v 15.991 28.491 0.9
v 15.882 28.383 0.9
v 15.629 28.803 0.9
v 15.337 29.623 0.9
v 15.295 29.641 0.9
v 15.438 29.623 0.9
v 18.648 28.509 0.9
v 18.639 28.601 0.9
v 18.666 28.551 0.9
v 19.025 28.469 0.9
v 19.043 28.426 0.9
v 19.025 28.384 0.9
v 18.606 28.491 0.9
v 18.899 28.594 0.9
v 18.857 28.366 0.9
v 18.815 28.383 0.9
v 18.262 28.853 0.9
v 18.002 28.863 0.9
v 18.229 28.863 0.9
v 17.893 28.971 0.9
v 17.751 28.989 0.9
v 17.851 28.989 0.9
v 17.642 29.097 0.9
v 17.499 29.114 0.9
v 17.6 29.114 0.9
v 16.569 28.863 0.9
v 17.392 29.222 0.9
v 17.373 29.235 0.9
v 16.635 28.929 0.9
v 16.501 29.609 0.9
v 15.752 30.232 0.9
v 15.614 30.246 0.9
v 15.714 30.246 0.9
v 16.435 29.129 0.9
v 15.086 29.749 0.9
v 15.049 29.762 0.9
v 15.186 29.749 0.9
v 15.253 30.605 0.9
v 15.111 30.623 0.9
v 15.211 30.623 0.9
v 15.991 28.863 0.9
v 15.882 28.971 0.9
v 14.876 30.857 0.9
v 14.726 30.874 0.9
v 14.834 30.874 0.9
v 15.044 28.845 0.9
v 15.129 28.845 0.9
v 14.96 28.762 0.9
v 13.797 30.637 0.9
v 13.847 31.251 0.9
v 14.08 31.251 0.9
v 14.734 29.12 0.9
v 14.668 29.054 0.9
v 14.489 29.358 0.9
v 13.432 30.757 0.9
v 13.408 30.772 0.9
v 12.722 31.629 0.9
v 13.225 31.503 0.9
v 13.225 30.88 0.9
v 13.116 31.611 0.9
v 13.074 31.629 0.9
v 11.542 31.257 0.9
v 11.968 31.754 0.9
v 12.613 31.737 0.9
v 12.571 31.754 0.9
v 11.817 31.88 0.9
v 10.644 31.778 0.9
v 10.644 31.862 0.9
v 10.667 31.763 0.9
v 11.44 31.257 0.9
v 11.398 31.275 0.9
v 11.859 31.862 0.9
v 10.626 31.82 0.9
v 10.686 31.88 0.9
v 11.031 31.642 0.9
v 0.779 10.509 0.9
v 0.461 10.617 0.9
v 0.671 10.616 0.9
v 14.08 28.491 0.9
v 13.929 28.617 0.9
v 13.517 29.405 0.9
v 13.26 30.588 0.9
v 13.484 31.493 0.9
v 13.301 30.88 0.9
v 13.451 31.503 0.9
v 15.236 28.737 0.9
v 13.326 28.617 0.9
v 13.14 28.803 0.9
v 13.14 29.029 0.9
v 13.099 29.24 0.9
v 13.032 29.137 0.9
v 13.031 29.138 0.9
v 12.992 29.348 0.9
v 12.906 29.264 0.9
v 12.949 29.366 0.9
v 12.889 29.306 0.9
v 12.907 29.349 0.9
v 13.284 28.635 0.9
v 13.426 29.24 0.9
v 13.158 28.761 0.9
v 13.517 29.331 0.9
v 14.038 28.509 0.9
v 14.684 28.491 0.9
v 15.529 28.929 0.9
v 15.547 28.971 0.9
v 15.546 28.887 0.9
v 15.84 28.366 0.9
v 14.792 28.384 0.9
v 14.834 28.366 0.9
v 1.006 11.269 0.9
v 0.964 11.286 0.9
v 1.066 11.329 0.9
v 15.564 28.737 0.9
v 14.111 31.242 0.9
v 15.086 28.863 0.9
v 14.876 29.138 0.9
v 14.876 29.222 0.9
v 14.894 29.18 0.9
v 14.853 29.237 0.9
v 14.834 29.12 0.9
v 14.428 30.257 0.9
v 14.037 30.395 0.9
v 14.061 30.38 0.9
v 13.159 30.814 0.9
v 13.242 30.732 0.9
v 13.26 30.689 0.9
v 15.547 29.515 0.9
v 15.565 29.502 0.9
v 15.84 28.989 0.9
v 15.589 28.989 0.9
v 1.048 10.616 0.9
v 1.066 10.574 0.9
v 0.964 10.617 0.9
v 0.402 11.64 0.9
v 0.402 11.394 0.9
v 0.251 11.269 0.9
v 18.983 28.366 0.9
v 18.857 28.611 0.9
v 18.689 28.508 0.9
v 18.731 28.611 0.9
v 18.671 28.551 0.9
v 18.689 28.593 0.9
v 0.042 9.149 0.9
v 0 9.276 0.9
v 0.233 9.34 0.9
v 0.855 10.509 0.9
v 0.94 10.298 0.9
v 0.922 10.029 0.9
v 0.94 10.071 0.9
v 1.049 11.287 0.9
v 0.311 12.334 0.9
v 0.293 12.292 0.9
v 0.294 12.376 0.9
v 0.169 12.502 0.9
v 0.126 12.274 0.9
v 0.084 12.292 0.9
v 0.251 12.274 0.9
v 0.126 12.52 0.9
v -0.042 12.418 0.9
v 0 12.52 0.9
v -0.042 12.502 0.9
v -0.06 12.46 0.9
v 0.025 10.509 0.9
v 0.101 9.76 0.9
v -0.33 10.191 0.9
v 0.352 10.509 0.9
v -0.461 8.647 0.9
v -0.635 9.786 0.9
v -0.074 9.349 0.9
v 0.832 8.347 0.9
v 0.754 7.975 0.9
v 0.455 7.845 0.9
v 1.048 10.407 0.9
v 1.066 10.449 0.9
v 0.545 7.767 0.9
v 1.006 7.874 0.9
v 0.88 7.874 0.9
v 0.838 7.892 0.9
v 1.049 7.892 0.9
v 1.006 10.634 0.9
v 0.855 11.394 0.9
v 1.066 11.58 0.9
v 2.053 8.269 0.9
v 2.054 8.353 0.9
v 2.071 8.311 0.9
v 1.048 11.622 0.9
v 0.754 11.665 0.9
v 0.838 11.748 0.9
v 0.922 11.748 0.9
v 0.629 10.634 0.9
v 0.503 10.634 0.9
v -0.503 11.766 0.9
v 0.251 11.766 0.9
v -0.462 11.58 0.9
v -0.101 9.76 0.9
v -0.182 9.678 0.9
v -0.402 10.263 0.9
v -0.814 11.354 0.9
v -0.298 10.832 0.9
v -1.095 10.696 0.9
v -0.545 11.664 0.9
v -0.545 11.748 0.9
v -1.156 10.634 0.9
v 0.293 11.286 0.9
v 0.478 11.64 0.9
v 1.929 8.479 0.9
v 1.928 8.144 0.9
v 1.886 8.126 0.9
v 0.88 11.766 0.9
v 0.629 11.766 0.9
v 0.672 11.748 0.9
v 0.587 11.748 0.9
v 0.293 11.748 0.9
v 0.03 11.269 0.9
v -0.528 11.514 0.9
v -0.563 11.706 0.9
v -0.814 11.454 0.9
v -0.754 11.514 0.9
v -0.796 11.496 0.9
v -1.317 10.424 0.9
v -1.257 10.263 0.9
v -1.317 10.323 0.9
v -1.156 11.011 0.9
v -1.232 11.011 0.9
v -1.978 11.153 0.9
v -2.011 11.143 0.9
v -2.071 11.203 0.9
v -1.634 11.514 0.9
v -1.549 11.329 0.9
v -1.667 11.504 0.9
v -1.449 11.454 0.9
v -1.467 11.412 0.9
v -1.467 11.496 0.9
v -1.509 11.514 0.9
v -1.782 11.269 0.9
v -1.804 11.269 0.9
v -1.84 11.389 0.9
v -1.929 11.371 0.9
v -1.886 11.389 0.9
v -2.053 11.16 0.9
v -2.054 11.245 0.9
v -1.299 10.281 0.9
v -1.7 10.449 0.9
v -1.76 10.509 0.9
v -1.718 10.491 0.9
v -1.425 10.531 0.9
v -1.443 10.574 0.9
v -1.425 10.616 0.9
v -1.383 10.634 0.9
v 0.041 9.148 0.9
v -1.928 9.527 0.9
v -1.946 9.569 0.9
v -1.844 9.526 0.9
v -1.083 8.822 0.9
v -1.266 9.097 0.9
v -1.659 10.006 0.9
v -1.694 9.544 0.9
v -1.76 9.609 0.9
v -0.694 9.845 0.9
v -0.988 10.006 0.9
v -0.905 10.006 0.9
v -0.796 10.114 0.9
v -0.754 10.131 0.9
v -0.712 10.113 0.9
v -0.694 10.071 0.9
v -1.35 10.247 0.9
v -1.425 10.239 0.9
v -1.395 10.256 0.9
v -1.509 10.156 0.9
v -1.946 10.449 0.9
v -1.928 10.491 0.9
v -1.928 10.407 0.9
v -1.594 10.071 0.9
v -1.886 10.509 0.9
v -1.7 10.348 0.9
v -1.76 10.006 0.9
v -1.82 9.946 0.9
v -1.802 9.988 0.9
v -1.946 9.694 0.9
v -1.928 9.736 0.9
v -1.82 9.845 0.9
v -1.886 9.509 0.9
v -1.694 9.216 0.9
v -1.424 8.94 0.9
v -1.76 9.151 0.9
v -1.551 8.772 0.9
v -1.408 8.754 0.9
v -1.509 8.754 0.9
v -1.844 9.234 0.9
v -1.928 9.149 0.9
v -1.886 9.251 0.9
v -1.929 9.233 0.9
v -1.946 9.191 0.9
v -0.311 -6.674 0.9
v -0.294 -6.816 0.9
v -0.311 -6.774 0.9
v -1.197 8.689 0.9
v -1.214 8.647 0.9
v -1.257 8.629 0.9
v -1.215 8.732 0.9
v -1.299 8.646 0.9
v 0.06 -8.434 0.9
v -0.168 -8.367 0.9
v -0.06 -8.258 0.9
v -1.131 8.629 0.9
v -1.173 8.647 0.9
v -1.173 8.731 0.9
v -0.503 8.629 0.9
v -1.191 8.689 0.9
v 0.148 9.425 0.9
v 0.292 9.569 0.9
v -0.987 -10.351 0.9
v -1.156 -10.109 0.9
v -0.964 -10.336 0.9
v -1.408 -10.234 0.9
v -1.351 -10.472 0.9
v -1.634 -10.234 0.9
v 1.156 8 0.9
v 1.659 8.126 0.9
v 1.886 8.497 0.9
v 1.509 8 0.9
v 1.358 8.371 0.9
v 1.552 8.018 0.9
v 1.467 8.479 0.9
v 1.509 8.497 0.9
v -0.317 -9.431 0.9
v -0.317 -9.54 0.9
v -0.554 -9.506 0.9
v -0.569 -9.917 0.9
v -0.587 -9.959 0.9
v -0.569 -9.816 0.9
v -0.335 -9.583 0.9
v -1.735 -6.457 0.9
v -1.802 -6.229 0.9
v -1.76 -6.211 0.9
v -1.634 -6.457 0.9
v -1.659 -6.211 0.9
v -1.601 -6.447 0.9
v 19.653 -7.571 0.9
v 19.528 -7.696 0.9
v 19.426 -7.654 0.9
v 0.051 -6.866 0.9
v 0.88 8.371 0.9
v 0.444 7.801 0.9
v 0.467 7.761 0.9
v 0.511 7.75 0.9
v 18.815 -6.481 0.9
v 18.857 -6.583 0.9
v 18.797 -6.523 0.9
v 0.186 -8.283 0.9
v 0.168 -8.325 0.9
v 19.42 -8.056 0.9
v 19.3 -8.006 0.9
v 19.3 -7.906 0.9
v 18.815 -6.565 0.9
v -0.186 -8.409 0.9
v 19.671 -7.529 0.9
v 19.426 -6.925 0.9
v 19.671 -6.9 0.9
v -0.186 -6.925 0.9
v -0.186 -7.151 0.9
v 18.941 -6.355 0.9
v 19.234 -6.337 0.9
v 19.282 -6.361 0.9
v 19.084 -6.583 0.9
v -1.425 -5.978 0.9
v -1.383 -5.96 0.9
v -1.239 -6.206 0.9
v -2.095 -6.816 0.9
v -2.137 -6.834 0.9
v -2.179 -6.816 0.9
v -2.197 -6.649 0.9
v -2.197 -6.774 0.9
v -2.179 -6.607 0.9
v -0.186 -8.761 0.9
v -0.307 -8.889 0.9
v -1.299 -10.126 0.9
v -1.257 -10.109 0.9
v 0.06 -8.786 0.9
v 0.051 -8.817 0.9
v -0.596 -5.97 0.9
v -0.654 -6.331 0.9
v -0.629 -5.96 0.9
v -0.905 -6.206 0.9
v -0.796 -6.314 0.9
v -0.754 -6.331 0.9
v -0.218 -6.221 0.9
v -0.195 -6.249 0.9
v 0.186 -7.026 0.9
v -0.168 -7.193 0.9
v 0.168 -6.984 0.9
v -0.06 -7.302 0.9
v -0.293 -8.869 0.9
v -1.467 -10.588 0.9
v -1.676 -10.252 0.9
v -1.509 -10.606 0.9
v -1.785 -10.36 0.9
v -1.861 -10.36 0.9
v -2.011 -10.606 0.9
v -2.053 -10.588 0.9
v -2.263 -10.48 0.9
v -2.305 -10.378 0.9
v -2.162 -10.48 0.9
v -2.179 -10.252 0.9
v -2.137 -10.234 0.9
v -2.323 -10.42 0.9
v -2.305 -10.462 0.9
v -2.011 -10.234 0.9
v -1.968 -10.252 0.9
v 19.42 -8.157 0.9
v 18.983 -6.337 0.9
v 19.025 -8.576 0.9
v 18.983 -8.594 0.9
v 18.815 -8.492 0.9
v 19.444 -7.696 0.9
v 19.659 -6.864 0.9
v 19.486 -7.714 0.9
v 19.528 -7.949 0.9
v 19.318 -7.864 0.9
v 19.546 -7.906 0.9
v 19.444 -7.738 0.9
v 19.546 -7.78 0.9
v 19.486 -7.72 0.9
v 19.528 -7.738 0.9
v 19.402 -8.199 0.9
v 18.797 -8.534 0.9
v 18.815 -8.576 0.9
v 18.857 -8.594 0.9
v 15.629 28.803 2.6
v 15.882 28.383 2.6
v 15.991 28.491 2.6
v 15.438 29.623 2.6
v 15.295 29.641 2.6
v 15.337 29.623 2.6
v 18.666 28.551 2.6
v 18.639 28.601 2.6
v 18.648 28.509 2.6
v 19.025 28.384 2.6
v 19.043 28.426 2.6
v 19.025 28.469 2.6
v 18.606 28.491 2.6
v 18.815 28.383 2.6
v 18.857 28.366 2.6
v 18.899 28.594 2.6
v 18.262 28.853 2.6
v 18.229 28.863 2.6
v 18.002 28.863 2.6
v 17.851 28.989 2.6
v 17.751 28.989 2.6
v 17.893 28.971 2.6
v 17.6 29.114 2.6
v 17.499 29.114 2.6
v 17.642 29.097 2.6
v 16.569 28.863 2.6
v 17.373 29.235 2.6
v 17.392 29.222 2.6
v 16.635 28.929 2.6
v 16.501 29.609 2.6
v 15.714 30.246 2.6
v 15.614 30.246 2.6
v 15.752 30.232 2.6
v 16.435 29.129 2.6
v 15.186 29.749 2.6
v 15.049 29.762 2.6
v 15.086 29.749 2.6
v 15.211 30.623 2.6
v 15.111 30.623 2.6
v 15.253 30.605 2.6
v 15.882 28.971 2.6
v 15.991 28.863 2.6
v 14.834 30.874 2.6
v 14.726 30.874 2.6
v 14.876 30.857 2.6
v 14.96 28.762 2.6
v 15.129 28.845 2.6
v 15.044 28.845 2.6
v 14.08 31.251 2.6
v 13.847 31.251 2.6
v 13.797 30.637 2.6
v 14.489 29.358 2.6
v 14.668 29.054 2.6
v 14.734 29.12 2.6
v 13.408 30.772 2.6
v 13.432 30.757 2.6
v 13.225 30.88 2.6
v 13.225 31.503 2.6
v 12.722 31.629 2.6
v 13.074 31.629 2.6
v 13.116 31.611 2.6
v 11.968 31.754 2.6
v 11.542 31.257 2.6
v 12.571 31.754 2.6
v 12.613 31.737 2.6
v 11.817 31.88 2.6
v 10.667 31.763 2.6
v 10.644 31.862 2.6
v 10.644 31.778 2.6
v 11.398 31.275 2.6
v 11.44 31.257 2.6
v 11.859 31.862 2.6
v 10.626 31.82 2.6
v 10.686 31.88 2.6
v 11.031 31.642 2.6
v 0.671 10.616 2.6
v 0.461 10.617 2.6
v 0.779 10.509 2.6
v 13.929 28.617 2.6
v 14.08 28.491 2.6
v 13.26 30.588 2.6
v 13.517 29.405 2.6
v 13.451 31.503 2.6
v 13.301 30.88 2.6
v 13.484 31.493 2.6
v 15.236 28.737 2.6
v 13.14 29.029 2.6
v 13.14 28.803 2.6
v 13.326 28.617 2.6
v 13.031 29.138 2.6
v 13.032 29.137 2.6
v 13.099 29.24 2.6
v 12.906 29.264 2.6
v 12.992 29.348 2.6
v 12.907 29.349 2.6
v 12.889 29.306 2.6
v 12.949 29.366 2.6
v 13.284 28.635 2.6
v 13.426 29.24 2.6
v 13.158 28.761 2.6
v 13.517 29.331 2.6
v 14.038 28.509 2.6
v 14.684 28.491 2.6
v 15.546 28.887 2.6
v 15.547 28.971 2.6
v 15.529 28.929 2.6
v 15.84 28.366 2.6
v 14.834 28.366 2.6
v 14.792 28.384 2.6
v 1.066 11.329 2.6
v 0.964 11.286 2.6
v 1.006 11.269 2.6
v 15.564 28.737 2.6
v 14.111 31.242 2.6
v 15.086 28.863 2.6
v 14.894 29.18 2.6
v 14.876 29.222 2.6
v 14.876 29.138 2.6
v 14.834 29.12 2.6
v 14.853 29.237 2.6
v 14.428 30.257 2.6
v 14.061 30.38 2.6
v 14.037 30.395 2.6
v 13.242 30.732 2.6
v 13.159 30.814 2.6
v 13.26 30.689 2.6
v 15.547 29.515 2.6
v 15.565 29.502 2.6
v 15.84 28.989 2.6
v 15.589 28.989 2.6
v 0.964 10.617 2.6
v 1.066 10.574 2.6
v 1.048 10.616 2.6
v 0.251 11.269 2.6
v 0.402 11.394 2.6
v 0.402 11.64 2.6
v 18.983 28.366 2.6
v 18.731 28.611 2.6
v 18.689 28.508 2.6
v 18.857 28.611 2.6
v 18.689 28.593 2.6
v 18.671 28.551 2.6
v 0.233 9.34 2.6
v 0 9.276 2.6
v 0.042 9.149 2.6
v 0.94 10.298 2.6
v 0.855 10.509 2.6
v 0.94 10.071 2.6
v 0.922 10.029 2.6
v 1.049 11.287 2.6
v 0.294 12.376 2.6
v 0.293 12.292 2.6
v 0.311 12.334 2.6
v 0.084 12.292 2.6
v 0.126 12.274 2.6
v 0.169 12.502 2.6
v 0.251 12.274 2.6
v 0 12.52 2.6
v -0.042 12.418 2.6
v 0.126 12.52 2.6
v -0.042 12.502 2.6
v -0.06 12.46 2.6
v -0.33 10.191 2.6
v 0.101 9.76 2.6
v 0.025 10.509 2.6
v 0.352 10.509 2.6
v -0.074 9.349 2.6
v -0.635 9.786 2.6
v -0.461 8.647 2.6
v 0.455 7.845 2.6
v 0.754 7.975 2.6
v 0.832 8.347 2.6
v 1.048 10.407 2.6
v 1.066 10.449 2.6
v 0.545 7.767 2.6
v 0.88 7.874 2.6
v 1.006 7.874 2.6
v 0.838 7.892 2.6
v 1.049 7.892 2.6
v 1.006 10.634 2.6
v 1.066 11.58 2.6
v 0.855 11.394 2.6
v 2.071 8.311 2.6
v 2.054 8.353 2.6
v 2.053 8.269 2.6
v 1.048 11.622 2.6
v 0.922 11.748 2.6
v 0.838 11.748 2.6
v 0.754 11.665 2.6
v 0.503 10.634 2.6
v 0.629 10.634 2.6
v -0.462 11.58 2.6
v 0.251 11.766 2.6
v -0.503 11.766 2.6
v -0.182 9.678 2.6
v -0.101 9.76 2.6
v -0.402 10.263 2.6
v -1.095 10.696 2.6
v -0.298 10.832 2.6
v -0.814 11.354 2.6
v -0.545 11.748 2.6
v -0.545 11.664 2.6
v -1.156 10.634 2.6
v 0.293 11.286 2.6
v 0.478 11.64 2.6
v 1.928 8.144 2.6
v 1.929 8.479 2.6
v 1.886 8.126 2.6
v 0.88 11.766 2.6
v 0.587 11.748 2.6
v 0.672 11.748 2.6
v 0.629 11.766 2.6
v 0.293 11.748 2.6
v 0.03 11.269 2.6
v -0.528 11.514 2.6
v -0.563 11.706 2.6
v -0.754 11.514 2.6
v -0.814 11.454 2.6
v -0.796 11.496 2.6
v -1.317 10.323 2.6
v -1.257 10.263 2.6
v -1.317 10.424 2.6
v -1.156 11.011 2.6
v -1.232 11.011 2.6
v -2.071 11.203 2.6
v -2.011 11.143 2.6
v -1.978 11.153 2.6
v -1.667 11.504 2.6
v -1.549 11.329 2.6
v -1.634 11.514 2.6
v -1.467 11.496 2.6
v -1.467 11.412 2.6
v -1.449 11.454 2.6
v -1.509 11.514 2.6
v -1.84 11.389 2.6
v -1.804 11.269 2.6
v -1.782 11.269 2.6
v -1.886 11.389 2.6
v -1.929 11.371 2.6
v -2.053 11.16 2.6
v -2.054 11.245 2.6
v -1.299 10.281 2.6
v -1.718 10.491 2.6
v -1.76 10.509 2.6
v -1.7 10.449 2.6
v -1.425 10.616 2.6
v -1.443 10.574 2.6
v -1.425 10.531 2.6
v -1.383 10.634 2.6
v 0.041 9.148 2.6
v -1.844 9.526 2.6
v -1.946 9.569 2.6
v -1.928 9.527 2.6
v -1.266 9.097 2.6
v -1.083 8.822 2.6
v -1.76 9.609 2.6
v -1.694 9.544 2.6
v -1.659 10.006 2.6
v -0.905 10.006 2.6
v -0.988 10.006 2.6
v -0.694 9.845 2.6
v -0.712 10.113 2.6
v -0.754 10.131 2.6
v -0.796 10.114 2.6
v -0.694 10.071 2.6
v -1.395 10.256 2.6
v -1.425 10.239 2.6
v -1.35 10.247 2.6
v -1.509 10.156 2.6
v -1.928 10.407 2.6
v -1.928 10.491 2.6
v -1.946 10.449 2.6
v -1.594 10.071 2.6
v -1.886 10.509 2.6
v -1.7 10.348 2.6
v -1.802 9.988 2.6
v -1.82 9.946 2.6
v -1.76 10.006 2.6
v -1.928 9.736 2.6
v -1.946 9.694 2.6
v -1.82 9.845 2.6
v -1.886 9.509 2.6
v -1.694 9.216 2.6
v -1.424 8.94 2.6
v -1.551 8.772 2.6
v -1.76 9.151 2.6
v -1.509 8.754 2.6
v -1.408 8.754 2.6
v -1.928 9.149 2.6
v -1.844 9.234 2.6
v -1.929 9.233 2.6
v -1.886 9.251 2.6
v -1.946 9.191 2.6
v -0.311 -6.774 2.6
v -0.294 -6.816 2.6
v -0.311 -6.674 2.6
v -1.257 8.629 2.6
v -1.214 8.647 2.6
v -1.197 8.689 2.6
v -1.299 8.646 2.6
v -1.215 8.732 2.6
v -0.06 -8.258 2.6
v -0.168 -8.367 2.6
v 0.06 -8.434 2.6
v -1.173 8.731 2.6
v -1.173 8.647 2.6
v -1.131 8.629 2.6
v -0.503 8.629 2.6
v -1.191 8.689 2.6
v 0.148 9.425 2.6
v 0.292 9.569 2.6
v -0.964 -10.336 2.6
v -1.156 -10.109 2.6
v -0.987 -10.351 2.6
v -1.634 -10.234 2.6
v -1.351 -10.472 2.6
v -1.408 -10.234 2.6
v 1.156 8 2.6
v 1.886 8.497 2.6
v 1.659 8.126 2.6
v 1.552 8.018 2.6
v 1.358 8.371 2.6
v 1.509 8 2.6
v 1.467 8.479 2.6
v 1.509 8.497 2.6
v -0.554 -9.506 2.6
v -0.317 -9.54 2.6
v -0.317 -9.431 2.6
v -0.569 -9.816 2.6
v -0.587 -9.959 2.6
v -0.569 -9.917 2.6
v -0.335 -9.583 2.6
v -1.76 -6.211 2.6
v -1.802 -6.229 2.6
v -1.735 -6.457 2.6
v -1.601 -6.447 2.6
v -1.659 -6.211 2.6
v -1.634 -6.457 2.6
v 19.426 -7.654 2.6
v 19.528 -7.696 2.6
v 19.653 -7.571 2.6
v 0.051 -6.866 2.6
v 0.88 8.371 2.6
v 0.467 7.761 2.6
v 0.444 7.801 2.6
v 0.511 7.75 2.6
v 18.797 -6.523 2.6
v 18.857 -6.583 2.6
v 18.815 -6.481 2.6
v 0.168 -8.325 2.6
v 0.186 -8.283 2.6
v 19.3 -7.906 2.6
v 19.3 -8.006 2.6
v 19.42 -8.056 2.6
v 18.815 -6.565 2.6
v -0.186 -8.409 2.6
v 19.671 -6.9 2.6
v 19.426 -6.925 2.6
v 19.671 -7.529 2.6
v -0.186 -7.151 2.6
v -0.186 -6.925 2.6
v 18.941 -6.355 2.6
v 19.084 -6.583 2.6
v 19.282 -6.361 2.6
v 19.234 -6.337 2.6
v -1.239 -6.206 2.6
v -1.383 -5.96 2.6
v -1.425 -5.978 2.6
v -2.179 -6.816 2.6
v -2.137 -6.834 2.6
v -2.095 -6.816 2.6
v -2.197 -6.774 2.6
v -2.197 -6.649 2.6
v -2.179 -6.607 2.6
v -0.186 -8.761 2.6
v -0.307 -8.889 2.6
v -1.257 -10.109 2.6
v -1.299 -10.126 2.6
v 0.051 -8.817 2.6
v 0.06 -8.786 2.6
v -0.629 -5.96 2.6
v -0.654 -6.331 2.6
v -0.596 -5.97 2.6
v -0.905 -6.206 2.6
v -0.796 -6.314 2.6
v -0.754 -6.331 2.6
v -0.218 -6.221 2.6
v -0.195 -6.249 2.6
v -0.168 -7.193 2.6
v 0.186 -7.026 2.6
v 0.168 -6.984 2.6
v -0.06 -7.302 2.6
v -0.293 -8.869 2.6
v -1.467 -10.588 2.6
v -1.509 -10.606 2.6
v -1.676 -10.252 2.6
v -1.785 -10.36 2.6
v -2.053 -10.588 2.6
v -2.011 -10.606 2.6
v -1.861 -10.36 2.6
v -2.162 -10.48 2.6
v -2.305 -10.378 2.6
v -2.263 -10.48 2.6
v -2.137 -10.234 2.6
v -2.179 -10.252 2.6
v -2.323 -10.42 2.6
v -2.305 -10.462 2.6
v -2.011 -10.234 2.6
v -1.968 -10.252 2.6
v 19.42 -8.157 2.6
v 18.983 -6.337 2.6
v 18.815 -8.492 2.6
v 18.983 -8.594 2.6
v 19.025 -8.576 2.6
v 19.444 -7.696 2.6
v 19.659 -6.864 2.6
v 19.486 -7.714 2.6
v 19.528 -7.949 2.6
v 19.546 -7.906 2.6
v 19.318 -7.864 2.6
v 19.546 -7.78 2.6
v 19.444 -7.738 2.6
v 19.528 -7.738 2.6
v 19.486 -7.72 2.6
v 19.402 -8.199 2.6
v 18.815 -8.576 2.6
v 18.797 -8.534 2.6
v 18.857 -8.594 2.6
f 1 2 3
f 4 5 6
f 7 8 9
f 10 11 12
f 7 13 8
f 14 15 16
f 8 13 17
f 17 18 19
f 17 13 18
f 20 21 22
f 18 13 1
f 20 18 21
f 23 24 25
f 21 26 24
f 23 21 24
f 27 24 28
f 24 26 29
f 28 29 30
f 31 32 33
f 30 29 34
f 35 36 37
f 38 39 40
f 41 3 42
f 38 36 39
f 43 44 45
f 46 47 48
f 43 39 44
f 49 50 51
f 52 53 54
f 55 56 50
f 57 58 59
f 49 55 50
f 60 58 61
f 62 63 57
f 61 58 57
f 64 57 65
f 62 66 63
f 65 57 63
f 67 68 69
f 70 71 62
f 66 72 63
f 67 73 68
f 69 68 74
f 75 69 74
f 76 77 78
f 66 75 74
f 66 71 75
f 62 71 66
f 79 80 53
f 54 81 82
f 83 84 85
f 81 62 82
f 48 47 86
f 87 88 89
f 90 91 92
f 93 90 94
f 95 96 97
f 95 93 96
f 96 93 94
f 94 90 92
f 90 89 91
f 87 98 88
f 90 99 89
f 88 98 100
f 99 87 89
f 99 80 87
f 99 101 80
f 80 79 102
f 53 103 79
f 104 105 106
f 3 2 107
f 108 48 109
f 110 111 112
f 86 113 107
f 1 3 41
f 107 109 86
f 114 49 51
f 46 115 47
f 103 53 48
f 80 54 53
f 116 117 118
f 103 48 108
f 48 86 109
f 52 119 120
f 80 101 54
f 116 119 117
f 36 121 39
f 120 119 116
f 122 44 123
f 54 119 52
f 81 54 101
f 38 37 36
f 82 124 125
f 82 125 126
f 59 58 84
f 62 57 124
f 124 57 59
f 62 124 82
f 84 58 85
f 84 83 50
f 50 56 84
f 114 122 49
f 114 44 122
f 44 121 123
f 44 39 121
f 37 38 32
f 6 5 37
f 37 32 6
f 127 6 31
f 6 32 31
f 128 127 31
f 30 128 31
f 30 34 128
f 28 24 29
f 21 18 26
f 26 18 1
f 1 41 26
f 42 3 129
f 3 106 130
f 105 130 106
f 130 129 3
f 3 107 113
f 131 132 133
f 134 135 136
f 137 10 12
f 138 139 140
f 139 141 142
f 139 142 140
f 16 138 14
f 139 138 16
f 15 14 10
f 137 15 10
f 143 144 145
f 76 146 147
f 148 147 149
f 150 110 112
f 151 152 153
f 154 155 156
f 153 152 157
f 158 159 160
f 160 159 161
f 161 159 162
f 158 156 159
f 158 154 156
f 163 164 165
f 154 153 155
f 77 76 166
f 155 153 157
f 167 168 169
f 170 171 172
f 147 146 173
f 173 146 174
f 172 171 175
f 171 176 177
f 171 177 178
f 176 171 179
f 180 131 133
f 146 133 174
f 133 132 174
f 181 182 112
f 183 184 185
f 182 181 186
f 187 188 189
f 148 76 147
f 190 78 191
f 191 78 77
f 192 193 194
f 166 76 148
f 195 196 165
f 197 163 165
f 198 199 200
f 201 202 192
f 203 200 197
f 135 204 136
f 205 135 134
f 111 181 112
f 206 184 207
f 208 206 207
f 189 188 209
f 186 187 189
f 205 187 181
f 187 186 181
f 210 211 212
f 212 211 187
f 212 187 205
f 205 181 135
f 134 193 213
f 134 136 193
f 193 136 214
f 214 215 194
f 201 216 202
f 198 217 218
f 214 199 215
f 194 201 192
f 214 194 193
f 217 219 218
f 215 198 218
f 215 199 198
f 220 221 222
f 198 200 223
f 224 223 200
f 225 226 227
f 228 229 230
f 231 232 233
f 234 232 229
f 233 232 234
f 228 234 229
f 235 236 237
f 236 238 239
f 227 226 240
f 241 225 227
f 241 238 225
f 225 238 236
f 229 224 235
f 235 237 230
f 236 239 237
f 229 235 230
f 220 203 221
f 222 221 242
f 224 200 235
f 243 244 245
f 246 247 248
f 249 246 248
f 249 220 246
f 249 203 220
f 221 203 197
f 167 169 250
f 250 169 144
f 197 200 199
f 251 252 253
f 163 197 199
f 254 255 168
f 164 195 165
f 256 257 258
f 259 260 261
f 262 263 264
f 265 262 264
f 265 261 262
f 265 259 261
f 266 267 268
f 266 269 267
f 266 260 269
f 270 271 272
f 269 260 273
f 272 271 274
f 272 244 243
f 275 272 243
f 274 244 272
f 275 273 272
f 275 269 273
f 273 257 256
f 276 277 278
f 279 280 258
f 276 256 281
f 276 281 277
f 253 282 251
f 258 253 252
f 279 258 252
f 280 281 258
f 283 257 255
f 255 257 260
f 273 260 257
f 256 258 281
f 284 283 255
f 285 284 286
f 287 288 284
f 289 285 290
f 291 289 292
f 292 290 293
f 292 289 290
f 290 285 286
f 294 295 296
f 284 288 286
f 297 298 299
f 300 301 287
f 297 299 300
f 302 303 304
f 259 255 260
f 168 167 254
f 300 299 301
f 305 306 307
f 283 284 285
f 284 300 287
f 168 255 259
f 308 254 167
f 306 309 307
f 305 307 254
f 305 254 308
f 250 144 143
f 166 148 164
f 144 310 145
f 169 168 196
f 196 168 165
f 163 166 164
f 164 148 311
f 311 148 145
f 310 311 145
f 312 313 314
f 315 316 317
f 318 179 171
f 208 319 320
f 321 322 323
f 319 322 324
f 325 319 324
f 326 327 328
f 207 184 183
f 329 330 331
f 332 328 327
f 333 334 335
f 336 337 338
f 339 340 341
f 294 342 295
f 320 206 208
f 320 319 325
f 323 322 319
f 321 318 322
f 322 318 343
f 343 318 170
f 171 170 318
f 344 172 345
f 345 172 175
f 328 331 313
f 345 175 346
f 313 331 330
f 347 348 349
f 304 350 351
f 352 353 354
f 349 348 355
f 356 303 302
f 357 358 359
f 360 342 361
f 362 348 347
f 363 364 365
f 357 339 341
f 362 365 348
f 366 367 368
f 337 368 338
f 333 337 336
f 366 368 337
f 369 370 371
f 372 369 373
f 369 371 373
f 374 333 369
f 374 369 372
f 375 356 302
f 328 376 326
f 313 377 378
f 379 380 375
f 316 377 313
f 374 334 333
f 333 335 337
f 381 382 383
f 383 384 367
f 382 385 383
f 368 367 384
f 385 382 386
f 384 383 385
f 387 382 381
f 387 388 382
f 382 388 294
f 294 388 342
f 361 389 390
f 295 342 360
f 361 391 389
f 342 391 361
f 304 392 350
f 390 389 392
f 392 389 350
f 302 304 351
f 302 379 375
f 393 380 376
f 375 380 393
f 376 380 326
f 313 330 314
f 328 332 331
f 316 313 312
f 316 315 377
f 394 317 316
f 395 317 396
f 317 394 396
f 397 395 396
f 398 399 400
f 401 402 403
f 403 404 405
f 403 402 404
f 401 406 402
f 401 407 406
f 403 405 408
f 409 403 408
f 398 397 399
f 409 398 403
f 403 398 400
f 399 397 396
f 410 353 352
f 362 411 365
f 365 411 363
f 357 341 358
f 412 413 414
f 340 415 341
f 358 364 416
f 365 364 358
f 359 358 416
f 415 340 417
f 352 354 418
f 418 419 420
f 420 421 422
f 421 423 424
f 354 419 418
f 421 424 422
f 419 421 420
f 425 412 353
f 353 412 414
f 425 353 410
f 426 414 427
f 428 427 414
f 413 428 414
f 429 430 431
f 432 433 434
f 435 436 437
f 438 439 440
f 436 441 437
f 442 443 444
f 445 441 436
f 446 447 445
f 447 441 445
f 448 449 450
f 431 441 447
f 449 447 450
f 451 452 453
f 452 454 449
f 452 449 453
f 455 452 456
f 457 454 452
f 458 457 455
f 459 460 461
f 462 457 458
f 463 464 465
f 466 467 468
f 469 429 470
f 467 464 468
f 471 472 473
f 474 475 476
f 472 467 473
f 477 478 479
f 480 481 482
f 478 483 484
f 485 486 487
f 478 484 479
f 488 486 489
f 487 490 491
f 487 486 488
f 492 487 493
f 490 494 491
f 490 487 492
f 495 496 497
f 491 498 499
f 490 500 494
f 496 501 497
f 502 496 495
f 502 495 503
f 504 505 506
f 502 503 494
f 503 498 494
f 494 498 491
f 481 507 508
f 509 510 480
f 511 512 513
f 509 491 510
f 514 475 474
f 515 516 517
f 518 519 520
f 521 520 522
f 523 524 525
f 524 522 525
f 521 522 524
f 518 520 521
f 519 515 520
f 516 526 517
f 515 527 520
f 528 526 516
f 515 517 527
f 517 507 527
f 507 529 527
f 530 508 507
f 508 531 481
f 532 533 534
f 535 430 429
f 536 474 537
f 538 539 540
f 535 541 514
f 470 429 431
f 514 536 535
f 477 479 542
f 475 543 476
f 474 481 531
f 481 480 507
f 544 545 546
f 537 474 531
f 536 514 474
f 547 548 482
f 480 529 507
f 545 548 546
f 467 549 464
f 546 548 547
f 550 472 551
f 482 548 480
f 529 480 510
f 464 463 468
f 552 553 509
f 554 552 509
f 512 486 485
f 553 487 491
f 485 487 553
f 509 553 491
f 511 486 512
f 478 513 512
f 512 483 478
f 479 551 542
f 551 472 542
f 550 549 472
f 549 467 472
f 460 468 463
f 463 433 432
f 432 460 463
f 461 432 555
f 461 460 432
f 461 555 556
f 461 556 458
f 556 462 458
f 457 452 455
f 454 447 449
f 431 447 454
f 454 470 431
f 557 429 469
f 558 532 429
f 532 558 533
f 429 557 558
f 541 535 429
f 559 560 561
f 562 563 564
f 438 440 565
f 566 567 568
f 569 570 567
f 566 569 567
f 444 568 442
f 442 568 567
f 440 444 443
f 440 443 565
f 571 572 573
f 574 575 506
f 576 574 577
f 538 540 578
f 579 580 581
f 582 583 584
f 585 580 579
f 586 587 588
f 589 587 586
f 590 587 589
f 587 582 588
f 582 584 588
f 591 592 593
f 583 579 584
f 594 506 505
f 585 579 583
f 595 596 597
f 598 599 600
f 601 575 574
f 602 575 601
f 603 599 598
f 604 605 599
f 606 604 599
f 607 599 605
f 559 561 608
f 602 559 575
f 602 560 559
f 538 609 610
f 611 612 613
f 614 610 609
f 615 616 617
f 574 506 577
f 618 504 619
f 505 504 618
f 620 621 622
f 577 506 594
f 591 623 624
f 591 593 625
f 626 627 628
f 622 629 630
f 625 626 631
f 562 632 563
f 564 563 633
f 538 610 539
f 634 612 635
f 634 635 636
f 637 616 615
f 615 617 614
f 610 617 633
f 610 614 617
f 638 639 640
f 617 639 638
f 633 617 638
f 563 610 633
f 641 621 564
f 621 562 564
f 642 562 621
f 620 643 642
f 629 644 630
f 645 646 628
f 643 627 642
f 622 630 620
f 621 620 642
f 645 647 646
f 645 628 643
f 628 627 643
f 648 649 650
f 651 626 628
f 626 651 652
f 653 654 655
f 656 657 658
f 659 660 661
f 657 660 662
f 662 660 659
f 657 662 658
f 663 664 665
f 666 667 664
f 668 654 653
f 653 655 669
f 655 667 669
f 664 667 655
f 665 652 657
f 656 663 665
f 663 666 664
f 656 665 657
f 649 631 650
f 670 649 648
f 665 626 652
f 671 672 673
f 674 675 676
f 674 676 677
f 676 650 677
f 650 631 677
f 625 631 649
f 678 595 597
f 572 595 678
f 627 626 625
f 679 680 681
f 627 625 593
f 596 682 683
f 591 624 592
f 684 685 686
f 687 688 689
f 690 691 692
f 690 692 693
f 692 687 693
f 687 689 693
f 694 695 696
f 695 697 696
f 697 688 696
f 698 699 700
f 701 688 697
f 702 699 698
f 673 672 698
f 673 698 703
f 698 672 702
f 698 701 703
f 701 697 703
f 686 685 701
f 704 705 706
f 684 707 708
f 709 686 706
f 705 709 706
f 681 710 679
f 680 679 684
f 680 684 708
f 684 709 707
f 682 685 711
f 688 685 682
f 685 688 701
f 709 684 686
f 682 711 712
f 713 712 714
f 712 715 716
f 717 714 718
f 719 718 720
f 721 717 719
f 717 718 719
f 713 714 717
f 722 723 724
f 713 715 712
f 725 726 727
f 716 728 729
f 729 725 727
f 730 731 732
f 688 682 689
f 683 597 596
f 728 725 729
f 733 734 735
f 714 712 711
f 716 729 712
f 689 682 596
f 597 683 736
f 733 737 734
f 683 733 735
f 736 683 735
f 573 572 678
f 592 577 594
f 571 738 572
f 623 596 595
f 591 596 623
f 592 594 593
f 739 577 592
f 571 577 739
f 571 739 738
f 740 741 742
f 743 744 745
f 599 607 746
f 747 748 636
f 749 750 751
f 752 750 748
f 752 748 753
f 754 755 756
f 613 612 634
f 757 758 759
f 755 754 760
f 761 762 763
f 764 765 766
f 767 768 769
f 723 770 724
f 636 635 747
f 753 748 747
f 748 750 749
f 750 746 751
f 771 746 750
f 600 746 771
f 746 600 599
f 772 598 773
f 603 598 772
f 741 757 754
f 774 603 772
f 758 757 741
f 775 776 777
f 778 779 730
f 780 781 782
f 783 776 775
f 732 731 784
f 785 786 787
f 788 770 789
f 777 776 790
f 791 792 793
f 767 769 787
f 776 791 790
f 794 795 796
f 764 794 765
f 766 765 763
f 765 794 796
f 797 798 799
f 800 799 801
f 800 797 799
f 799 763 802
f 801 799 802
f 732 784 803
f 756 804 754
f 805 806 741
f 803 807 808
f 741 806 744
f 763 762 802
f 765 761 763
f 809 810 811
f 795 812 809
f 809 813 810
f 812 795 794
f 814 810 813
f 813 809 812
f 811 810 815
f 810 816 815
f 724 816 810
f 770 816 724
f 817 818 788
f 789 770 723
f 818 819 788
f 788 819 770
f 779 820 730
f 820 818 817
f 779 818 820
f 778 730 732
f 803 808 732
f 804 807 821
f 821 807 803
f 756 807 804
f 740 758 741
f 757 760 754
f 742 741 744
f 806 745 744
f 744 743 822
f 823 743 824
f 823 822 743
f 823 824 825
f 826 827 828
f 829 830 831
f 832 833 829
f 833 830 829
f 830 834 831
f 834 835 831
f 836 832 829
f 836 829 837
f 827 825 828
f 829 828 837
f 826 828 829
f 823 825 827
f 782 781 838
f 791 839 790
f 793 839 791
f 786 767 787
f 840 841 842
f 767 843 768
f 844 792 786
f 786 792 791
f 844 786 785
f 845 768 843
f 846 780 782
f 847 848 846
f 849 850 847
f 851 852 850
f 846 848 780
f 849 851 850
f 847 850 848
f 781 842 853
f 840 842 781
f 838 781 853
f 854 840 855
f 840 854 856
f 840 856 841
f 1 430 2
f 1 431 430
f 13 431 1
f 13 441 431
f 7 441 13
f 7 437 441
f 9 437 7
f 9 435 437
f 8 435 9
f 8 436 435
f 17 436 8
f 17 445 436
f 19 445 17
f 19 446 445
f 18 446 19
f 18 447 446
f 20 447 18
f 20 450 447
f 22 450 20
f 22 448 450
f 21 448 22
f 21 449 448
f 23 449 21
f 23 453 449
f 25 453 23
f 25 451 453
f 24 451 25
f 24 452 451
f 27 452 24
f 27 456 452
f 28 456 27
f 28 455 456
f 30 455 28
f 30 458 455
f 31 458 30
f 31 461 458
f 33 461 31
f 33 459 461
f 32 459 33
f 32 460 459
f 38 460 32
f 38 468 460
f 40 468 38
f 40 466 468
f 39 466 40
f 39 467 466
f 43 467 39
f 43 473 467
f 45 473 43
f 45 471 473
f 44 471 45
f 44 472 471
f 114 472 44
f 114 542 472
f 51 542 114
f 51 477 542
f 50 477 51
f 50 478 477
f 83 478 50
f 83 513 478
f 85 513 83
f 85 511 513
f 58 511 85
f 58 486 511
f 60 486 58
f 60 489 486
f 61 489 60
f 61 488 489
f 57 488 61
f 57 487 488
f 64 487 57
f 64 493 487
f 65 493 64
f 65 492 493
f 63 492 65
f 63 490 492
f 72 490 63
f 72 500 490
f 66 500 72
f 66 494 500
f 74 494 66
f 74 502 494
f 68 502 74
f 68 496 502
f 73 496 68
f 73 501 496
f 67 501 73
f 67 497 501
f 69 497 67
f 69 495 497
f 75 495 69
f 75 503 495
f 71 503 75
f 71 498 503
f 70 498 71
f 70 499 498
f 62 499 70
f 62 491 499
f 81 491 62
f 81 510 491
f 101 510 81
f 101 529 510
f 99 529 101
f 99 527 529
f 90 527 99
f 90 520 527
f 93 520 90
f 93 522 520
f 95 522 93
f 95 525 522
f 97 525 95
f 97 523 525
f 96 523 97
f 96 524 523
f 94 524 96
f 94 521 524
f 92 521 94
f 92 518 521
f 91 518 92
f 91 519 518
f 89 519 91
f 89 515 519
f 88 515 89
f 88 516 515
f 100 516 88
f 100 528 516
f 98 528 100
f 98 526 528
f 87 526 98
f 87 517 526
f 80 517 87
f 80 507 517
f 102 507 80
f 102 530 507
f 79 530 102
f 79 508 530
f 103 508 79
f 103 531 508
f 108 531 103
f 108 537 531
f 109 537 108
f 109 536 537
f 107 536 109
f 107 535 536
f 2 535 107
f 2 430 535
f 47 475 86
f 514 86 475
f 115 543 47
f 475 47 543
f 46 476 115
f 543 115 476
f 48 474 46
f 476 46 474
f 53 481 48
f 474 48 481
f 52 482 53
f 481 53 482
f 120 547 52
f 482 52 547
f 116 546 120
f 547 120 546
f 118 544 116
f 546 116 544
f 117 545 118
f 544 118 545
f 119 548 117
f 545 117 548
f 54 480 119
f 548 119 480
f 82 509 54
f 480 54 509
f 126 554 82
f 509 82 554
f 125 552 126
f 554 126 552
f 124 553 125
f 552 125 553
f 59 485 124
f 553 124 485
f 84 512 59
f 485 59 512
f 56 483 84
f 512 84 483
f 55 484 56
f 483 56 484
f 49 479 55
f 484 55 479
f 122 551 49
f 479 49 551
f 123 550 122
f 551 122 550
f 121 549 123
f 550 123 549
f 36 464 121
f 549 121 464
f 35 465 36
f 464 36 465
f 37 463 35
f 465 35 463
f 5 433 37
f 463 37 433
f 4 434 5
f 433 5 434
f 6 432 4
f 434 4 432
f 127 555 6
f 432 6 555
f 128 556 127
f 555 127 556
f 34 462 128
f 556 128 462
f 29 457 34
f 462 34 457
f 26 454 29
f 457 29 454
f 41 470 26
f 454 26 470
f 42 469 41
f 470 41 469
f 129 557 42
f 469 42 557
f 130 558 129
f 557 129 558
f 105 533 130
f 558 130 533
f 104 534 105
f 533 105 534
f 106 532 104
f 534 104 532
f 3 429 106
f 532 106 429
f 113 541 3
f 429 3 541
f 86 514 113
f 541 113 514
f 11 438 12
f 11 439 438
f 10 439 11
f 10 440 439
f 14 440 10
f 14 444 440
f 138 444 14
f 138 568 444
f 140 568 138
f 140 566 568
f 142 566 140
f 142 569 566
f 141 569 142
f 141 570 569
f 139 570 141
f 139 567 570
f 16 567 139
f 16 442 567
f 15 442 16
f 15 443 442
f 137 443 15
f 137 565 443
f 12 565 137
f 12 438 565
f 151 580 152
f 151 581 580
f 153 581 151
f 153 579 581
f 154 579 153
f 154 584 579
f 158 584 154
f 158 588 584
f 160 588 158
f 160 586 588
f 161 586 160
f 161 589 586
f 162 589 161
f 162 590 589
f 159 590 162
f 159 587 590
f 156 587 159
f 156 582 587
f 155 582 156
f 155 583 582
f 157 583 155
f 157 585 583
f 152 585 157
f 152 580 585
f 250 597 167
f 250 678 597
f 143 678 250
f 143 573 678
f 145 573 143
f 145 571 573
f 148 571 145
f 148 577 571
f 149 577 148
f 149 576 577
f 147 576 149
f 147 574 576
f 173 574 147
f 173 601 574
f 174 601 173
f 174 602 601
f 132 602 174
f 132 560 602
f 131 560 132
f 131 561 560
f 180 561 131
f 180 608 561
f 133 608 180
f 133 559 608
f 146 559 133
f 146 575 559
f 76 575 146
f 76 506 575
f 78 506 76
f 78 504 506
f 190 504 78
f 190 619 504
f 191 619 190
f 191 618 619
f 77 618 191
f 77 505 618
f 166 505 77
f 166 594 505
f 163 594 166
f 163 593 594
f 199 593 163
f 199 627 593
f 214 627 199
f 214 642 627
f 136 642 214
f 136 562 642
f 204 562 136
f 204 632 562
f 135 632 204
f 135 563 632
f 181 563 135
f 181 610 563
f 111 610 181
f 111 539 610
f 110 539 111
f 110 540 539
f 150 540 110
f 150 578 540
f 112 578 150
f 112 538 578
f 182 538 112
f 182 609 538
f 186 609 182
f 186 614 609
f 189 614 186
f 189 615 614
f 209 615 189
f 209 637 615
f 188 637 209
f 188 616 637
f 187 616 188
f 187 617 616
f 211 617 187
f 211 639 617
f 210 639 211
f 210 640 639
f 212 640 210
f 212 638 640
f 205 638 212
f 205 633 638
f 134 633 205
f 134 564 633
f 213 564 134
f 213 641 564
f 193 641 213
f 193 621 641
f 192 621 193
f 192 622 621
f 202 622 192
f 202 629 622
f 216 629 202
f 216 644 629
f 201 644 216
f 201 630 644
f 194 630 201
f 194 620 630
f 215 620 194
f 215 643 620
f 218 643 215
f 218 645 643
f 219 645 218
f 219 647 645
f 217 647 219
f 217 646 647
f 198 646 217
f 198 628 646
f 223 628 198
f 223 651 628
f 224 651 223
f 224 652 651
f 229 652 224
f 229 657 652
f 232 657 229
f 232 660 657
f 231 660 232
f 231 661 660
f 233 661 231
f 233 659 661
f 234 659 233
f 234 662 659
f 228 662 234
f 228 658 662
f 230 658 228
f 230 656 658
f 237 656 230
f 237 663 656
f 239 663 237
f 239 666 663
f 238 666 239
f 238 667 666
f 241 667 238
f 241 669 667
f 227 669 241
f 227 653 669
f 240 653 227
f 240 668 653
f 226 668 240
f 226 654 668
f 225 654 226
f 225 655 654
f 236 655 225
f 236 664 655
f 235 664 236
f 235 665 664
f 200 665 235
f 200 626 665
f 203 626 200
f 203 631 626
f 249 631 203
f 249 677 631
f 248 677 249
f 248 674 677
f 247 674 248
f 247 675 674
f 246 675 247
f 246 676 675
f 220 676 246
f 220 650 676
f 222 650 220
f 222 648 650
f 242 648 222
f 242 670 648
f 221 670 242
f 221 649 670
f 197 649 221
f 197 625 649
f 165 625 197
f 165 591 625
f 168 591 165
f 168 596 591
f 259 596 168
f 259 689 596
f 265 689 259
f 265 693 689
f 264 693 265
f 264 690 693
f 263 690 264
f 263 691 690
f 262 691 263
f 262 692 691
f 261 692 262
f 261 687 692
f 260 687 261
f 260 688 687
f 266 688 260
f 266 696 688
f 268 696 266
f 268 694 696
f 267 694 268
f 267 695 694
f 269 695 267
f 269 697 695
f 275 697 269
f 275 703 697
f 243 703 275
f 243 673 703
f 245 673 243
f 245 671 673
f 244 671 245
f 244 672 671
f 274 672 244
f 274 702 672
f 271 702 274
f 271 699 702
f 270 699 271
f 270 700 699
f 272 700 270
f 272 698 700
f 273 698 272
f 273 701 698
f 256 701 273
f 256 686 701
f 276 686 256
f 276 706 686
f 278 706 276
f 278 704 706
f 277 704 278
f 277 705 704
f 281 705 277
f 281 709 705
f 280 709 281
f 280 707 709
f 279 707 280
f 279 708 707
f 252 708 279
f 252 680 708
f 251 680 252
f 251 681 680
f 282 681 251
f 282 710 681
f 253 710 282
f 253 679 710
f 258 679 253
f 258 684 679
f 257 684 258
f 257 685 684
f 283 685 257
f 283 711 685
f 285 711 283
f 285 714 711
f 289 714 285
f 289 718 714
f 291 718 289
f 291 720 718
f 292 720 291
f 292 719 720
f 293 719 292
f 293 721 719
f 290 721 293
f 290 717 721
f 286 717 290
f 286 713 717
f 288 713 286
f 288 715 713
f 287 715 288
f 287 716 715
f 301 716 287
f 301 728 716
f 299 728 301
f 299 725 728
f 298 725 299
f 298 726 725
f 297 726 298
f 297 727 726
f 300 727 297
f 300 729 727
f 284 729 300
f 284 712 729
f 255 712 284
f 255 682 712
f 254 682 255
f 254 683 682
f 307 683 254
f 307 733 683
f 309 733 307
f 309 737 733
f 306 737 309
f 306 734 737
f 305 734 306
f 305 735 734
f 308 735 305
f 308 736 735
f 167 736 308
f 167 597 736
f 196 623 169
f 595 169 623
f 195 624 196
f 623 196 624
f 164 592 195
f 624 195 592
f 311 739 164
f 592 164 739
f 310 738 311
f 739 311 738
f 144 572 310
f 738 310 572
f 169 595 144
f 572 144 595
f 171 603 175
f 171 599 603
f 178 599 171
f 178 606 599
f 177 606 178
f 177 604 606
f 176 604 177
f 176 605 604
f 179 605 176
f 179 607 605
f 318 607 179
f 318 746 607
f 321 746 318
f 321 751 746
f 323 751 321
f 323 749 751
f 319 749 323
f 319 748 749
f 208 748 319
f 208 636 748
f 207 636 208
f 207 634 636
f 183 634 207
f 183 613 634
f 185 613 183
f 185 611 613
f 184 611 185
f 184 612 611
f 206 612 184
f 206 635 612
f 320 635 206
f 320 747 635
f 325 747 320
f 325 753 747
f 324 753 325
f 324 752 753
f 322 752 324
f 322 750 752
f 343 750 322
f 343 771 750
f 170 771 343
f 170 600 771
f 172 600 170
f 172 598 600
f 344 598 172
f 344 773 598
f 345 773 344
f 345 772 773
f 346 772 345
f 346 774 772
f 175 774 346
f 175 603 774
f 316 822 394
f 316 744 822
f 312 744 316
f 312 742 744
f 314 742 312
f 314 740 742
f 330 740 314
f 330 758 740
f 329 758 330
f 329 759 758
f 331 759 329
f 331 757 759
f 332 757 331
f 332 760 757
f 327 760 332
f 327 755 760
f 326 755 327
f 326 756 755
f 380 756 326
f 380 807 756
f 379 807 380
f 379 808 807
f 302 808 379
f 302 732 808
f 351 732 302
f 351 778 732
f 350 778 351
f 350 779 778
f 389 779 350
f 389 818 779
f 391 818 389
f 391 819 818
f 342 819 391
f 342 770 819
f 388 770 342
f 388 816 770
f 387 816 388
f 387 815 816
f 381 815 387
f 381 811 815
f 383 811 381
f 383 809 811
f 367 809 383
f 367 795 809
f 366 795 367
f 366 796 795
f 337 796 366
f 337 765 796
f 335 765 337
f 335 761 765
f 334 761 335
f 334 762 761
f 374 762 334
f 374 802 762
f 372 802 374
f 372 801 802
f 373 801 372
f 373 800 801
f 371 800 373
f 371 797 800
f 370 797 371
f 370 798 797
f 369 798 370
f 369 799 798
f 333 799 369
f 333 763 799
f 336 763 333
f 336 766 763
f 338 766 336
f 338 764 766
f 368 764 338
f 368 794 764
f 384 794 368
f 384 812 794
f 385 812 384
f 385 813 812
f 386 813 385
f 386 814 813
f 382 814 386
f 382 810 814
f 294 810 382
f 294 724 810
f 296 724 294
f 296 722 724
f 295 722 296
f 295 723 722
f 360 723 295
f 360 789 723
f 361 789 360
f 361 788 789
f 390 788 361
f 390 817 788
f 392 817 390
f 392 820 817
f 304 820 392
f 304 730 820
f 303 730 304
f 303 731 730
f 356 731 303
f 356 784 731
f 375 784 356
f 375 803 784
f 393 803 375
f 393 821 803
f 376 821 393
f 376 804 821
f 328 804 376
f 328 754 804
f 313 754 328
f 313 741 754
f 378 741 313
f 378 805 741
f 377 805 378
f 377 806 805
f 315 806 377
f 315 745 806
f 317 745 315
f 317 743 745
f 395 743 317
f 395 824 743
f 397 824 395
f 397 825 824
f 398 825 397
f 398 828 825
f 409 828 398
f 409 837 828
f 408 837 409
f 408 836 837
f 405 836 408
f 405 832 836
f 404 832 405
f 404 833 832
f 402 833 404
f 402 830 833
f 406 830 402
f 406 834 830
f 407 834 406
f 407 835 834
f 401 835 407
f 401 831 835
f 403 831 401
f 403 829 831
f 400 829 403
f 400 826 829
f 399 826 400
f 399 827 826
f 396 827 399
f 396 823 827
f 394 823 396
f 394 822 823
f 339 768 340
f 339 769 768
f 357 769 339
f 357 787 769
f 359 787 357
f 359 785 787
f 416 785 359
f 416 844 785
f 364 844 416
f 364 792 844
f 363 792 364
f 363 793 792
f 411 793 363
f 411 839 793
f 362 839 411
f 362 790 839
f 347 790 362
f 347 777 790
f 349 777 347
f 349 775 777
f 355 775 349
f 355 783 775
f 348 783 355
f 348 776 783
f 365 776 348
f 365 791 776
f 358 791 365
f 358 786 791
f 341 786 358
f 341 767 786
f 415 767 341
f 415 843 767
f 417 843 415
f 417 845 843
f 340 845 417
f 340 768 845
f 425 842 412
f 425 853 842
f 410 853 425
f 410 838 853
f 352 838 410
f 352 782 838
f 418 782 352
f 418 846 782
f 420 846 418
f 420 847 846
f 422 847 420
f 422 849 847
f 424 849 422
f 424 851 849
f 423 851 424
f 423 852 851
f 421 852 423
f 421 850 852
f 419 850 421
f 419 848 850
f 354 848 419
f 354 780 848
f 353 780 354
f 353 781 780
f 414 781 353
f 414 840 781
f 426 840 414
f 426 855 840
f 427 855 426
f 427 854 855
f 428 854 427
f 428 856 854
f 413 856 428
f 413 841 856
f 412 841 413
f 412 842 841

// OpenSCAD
$fn = 24;
translate([0, -2.500, 0.900])
  linear_extrude(height=1.700) {
offset(r=0.06, $fn=8) {
    polygon(points=[[19.234,-3.897],[18.983,-3.897],[18.857,-4.023],[19.109,-4.023],[19.486,-4.400],[19.486,-5.280],[19.360,-5.406],[19.360,-5.531],[18.857,-6.034],[18.983,-6.034],[19.360,-5.657],[19.360,-5.531],[19.486,-5.406],[19.486,-5.154],[19.611,-5.029],[19.611,-4.400]], paths=[[0,1,2,3,4,5,6,7,8,9,10,11,12,13,14,15]]);
    polygon(points=[[-0.629,-3.520],[-1.383,-3.520],[-1.634,-3.771],[-1.760,-3.771],[-2.137,-4.149],[-2.137,-4.274],[-2.263,-4.400],[-1.760,-3.897],[-1.634,-3.897],[-1.257,-3.646],[-0.880,-3.646],[-0.754,-3.771],[-0.629,-3.771],[-0.251,-4.149],[-0.251,-4.274],[-0.126,-4.400],[-0.126,-4.651],[0.000,-4.777],[0.000,-5.783],[-0.126,-5.909],[-0.126,-6.286],[-0.251,-6.411],[-0.503,-7.040],[-1.131,-7.669],[-1.257,-7.669],[-1.383,-7.794],[-1.634,-7.794],[-1.760,-7.920],[-1.886,-7.920],[-2.011,-7.794],[-2.137,-7.794],[-2.263,-7.920],[-2.137,-7.920],[-2.011,-8.046],[-1.509,-8.046],[-1.383,-7.920],[-1.006,-7.794],[-0.629,-7.417],[-0.629,-7.291],[-0.377,-7.040],[-0.377,-6.914],[0.000,-6.286],[0.000,-5.909],[0.126,-5.783],[0.126,-4.526],[0.000,-4.400],[-0.251,-3.771]], paths=[[0,1,2,3,4,5,6,7,8,9,10,11,12,13,14,15,16,17,18,19,20,21,22,23,24,25,26,27,28,29,30,31,32,33,34,35,36,37,38,39,40,41,42,43,44,45,46]]);
    polygon(points=[[2.137,10.811],[2.011,10.811],[1.886,10.937],[1.509,10.937],[1.383,10.811],[0.880,10.811],[0.503,10.309],[0.754,10.560],[0.880,10.434],[1.006,10.434],[1.131,10.560],[1.509,10.560],[1.634,10.686],[1.886,10.686],[2.011,10.811]], paths=[[0,1,2,3,4,5,6,7,8,9,10,11,12,13,14]]);
    polygon(points=[[0.126,14.960],[-0.126,14.960],[0.000,14.960],[0.126,14.834],[0.000,14.709],[-0.251,14.709],[0.000,14.709],[0.377,14.457],[0.000,14.709],[0.126,14.834],[0.377,14.834],[0.880,14.331],[0.880,14.206],[0.754,14.080],[0.629,14.206],[0.503,14.080],[0.377,14.080],[0.251,14.206],[-0.880,14.206],[-1.257,13.954],[-1.634,13.954],[-2.011,13.703],[-1.886,13.829],[-1.760,13.829],[-1.006,13.200],[-1.131,13.074],[-1.634,13.074],[-1.760,12.949],[-1.886,12.949],[-1.509,12.571],[-1.634,12.446],[-1.760,12.446],[-1.760,12.320],[-1.886,12.194],[-1.886,12.069],[-1.760,12.194],[-1.634,12.069],[-1.634,11.691],[-1.760,11.566],[-1.886,11.691],[-2.011,11.691],[-1.886,11.691],[-1.509,11.314],[-1.383,11.314],[-1.257,11.189],[-0.503,11.189],[0.880,12.571],[0.880,12.823],[1.006,12.949],[1.006,14.080],[0.880,14.206],[0.880,14.331],[0.377,14.834],[0.251,14.834],[-1.257,11.691],[-1.006,11.314],[-1.131,11.189],[-1.257,11.189],[-1.509,11.440],[-0.251,12.194],[-0.126,12.320],[0.126,12.320],[0.377,12.069],[0.000,11.691],[-0.126,11.817],[-1.383,12.697],[-1.257,12.823],[-0.377,12.823],[-0.251,12.697],[-0.629,12.194],[-0.754,12.320],[-0.754,12.571],[-0.880,12.446],[-1.006,12.446],[-1.760,12.949],[-1.634,13.074],[-1.383,13.074],[-1.257,12.949],[-1.257,12.823],[-1.509,12.571],[-1.760,12.823],[-0.377,13.326],[0.000,13.829],[0.251,13.829],[0.377,13.954],[0.880,13.954],[1.006,13.829],[1.006,13.074],[0.880,12.949],[0.754,12.949],[0.629,13.074],[0.503,13.074],[0.377,12.949],[0.000,12.949],[-0.377,14.080],[-0.503,13.954],[-0.754,13.954],[-0.754,13.829],[-1.131,13.451],[-1.257,13.451],[-1.634,13.829],[-1.509,13.954],[-1.257,13.954],[-0.880,14.206],[-0.503,14.206]], paths=[[0,1,2,3,4,5,6,7,8,9,10,11,12,13,14,15,16,17,18,19,20,21,22,23,24,25,26,27,28,29,30,31,32,33,34,35,36,37,38,39,40,41,42,43,44,45,46,47,48,49,50,51,52,53],[54,55,56,57,58],[59,60,61,62,63,64],[65,66,67,68,69,70,71,72,73],[74,75,76,77,78,79,80],[81,82,83,84,85,86,87,88,89,90,91,92,93],[94,95,96,97,98,99,100,101,102,103,104]]);
    polygon(points=[[10.686,34.320],[11.063,34.194],[11.440,33.817],[11.566,33.817],[13.577,31.931],[13.577,31.806],[13.451,31.680],[13.074,31.680],[12.949,31.806],[13.200,31.554],[13.200,31.303],[13.326,31.177],[13.954,31.177],[14.080,31.051],[14.709,31.051],[14.834,30.926],[15.840,30.926],[15.966,31.051],[18.731,31.051],[18.857,30.926],[19.109,30.926],[18.983,30.926],[18.857,31.051],[18.606,31.051],[18.229,31.303],[17.977,31.303],[17.851,31.429],[17.726,31.429],[17.600,31.554],[17.474,31.554],[17.349,31.680],[16.469,32.057],[15.714,32.686],[15.589,32.686],[15.211,33.063],[15.086,33.063],[14.834,33.314],[14.709,33.314],[14.080,33.691],[13.829,33.691],[13.451,33.943],[13.200,33.943],[13.074,34.069],[12.697,34.069],[12.571,34.194],[11.943,34.194],[11.817,34.320],[14.583,31.554],[14.709,31.680],[14.834,31.680],[14.960,31.554],[15.211,31.554],[15.337,31.429],[15.589,31.429],[15.714,31.303],[15.589,31.177],[15.211,31.177],[15.086,31.303],[14.960,31.177],[13.074,33.314],[13.200,33.440],[13.326,33.440],[13.451,33.314],[13.829,33.189],[14.080,32.937],[14.457,32.811],[15.086,32.309],[15.211,32.309],[15.337,32.183],[15.463,32.183],[15.589,32.057],[16.469,31.680],[16.720,31.429],[16.594,31.303],[15.966,31.303],[15.840,31.429],[15.337,31.429],[15.211,31.554],[14.960,31.554],[14.834,31.680],[14.457,31.806],[13.200,33.063],[13.200,33.189]], paths=[[0,1,2,3,4,5,6,7,8,9,10,11,12,13,14,15,16,17,18,19,20,21,22,23,24,25,26,27,28,29,30,31,32,33,34,35,36,37,38,39,40,41,42,43,44,45,46],[47,48,49,50,51,52,53,54,55,56,57,58],[59,60,61,62,63,64,65,66,67,68,69,70,71,72,73,74,75,76,77,78,79,80,81,82]]);
}
}
